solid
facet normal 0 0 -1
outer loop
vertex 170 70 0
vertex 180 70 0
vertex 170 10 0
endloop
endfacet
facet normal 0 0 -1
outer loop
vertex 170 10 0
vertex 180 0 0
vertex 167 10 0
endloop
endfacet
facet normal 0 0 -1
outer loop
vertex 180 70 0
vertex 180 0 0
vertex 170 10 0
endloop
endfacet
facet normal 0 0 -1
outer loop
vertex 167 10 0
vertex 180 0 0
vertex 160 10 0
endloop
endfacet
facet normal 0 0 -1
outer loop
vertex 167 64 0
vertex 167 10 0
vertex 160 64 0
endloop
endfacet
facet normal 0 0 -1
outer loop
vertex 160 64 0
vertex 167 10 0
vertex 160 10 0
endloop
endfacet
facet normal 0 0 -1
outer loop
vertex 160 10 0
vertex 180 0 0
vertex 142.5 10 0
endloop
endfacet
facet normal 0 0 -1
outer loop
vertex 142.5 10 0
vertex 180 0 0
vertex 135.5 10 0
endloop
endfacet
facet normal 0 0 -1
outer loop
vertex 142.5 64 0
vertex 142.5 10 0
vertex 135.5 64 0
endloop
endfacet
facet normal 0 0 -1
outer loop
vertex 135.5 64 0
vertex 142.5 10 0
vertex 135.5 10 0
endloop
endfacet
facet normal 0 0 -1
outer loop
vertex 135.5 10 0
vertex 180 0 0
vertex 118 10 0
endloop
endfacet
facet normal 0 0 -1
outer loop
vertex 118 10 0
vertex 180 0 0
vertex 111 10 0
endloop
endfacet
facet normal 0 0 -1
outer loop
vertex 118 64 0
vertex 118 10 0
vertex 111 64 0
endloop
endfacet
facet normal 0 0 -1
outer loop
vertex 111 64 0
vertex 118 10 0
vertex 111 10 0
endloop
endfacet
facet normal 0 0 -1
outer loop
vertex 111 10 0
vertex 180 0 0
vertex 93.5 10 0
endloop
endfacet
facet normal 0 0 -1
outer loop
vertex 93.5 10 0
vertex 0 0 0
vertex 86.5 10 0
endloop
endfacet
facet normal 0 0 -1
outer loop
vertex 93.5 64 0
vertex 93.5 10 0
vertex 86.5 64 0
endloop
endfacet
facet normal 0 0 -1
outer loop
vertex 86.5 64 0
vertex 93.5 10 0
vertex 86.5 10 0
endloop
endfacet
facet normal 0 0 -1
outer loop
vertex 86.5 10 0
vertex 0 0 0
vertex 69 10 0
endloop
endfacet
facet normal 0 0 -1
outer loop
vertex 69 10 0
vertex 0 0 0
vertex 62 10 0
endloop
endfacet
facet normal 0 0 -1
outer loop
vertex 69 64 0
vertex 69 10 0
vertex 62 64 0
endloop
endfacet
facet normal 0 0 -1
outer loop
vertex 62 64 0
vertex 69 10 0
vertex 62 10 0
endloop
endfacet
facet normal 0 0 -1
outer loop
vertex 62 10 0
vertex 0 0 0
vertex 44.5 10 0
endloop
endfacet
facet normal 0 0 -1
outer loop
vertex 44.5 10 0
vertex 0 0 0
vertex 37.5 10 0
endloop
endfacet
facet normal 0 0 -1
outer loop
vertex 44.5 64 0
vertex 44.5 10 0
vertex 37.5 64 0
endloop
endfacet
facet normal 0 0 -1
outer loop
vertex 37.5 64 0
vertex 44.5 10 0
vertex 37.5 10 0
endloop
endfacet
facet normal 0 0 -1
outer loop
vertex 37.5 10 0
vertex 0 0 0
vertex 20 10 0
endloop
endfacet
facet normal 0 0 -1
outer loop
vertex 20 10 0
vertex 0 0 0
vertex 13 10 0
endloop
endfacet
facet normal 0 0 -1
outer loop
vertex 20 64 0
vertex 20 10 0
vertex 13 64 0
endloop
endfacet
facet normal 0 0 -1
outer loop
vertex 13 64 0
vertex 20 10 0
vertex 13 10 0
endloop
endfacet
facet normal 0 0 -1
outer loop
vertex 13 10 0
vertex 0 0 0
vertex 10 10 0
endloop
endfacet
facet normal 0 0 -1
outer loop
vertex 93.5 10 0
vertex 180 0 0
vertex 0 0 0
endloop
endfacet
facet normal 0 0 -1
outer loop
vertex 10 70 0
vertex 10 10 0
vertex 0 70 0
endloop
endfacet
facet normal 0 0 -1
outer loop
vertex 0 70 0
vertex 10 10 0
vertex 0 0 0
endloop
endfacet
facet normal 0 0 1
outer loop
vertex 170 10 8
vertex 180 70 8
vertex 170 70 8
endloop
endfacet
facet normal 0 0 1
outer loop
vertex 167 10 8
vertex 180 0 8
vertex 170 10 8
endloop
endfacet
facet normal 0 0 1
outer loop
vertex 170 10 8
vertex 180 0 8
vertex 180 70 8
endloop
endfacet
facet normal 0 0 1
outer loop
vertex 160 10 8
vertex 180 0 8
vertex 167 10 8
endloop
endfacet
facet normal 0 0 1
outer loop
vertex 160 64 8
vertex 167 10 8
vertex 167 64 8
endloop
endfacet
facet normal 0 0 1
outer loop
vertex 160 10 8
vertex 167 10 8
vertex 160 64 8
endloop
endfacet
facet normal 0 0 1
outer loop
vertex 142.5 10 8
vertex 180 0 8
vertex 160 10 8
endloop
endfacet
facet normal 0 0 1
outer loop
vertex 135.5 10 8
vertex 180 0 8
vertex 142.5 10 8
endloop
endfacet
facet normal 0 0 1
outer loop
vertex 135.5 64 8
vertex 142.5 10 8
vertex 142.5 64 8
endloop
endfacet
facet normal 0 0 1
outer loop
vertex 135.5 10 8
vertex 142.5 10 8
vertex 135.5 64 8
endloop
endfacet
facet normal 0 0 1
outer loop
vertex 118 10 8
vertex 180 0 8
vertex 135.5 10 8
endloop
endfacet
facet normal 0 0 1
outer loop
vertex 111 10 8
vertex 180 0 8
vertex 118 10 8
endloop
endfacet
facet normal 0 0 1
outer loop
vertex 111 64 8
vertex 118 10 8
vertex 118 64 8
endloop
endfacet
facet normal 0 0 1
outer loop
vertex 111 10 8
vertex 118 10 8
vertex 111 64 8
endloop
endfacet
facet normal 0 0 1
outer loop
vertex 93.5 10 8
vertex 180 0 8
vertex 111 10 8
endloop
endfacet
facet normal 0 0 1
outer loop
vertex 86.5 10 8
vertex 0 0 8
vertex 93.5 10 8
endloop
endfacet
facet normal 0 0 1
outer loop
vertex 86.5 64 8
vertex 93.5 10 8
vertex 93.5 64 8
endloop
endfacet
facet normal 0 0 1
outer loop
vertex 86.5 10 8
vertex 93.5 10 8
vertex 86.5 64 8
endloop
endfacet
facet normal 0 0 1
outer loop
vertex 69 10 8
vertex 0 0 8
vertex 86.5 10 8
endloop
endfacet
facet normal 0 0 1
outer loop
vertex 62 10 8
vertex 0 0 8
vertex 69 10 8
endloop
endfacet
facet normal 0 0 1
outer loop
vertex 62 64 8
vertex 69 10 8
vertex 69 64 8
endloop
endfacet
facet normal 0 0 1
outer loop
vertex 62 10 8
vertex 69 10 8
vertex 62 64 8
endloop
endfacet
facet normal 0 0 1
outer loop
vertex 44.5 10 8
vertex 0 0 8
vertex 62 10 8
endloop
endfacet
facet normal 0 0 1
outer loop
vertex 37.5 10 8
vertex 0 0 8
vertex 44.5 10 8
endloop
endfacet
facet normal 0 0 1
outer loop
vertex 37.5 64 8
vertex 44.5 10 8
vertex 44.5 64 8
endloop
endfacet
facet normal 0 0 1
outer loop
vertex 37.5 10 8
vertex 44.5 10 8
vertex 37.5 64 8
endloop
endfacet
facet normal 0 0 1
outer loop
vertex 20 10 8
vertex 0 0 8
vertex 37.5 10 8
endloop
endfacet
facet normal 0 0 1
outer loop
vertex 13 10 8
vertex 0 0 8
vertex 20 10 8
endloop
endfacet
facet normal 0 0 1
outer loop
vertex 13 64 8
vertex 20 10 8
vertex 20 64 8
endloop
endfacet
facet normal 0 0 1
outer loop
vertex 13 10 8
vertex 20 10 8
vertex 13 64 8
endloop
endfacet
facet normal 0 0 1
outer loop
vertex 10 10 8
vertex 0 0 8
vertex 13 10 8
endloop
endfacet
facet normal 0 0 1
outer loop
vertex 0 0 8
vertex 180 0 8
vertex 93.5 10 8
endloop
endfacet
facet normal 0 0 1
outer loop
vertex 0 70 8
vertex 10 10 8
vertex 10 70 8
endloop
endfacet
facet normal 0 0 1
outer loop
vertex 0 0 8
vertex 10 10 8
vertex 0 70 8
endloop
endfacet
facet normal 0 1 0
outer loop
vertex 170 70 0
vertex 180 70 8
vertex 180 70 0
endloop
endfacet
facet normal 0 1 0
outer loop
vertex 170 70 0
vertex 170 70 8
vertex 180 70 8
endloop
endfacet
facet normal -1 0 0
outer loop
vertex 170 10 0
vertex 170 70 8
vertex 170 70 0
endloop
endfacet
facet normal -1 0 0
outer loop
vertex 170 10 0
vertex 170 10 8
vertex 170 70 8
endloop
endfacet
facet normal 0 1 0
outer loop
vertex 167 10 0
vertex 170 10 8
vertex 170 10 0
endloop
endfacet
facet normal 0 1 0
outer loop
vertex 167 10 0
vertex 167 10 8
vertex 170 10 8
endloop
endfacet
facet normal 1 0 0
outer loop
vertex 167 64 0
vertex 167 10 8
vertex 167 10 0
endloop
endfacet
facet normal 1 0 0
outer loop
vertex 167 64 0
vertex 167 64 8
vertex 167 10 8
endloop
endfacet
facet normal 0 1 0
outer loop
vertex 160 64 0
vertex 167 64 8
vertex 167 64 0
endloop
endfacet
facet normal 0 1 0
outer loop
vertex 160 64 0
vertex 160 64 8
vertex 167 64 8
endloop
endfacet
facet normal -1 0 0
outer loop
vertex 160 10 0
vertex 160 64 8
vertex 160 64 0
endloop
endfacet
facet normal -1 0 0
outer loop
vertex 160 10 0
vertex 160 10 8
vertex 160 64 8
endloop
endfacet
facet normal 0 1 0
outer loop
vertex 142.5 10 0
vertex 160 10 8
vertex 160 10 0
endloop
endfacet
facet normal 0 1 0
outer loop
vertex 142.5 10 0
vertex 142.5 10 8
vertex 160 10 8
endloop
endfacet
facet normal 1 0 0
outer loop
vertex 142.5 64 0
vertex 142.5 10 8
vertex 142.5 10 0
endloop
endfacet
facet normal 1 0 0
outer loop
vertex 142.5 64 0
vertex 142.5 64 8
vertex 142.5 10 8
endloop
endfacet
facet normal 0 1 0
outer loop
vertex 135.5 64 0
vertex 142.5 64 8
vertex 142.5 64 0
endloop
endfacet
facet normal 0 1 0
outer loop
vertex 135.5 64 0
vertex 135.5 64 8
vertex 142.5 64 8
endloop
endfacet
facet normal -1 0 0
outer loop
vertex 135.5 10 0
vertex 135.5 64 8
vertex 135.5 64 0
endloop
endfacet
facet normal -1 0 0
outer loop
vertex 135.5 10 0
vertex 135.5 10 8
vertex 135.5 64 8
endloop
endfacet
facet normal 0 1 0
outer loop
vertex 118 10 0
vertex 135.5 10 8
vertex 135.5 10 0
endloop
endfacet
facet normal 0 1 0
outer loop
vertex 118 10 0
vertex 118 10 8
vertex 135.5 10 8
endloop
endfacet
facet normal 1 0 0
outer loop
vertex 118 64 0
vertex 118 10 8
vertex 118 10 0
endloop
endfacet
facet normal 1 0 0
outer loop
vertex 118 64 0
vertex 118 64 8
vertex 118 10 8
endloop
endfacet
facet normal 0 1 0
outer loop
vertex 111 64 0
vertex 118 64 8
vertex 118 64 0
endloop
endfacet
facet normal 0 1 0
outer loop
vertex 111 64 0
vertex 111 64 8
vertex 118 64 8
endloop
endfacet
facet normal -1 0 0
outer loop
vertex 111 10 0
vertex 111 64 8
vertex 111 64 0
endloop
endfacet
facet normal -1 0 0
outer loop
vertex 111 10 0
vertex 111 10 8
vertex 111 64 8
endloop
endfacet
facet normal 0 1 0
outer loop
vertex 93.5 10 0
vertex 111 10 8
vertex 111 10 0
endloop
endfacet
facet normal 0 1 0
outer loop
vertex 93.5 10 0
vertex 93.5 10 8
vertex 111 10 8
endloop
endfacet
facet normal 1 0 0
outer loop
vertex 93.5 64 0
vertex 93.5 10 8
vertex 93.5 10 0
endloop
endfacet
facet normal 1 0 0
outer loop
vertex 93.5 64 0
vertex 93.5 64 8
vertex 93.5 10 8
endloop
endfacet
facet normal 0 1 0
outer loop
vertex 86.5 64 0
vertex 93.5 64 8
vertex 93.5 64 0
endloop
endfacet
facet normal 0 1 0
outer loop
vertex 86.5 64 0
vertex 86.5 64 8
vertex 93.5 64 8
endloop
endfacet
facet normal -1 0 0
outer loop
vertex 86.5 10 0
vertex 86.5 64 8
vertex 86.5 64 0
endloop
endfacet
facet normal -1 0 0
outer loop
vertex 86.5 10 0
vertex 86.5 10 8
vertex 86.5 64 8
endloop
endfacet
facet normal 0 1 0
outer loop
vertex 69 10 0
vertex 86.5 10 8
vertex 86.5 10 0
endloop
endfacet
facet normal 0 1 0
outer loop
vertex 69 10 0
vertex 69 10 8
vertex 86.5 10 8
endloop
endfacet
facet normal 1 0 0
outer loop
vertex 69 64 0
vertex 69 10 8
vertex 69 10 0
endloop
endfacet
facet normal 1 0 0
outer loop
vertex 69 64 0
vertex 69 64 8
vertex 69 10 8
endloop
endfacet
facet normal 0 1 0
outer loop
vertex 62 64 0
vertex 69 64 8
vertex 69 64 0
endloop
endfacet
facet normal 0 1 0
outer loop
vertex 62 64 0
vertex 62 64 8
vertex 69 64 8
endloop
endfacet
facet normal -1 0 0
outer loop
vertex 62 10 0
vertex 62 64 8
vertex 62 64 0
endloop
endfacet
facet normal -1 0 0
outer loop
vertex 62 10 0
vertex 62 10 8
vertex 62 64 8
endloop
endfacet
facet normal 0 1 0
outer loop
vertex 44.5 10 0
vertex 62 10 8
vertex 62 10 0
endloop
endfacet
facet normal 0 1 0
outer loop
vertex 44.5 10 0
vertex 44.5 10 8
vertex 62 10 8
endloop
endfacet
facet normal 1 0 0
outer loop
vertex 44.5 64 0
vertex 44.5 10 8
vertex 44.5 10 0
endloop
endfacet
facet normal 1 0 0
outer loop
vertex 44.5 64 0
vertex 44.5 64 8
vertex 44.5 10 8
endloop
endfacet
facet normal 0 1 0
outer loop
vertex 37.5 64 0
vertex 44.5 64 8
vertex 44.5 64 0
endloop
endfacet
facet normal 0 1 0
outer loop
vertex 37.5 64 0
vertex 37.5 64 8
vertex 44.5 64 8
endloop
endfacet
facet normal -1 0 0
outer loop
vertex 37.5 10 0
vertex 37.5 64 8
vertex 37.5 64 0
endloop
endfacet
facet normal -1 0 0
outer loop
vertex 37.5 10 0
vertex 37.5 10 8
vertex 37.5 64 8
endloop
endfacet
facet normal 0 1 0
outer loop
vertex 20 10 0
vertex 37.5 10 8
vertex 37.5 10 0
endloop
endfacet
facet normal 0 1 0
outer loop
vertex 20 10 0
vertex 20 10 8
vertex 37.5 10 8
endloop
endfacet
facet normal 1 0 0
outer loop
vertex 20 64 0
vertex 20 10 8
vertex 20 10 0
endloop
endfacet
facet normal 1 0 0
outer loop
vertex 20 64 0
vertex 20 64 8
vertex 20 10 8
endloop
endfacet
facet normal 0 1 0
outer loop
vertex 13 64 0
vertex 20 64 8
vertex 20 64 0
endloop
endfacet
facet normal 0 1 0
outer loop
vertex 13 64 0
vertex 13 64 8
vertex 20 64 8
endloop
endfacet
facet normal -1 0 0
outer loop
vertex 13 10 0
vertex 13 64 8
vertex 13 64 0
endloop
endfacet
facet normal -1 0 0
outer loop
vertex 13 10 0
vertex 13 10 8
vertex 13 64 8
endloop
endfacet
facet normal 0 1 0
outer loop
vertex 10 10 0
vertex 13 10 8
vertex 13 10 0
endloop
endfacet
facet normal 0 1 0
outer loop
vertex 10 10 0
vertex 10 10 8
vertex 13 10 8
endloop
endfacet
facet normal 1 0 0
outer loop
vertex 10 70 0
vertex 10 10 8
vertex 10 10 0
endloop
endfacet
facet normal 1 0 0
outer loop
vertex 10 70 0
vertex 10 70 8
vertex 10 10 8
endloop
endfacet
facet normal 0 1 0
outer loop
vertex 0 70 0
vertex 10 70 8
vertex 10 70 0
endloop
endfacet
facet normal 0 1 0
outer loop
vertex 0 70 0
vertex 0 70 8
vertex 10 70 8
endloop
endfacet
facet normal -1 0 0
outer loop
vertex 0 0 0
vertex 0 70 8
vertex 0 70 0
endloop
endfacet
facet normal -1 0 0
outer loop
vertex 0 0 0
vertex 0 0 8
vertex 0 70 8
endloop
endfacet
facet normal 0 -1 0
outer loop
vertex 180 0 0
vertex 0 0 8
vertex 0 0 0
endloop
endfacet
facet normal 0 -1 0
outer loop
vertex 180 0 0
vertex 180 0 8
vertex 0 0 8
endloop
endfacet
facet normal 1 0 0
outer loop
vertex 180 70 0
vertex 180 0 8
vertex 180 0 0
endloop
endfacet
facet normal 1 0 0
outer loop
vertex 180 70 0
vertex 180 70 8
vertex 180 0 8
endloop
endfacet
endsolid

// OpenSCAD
$fn = 32;

// ----------------------------------------------------------------------
// Guard grille: 7 slats over a 180 x 70 mm plate
// ----------------------------------------------------------------------

// --- parameters (mm) ---
profile_height = 8;       // extrusion height
profile_points = 36;      // points of the closed outline

profile = [[0, 0], [180, 0], [180, 70], [170, 70], [170, 10], [167, 10], [167, 64], [160, 64], [160, 10], [142.5, 10], [142.5, 64], [135.5, 64], [135.5, 10], [118, 10], [118, 64], [111, 64], [111, 10], [93.5, 10], [93.5, 64], [86.5, 64], [86.5, 10], [69, 10], [69, 64], [62, 64], [62, 10], [44.5, 10], [44.5, 64], [37.5, 64], [37.5, 10], [20, 10], [20, 64], [13, 64], [13, 10], [10, 10], [10, 70], [0, 70]];  // single closed polygon, 36 points, counter clockwise

// --- the one profile operation ---
linear_extrude(height = profile_height) polygon(points = profile);
